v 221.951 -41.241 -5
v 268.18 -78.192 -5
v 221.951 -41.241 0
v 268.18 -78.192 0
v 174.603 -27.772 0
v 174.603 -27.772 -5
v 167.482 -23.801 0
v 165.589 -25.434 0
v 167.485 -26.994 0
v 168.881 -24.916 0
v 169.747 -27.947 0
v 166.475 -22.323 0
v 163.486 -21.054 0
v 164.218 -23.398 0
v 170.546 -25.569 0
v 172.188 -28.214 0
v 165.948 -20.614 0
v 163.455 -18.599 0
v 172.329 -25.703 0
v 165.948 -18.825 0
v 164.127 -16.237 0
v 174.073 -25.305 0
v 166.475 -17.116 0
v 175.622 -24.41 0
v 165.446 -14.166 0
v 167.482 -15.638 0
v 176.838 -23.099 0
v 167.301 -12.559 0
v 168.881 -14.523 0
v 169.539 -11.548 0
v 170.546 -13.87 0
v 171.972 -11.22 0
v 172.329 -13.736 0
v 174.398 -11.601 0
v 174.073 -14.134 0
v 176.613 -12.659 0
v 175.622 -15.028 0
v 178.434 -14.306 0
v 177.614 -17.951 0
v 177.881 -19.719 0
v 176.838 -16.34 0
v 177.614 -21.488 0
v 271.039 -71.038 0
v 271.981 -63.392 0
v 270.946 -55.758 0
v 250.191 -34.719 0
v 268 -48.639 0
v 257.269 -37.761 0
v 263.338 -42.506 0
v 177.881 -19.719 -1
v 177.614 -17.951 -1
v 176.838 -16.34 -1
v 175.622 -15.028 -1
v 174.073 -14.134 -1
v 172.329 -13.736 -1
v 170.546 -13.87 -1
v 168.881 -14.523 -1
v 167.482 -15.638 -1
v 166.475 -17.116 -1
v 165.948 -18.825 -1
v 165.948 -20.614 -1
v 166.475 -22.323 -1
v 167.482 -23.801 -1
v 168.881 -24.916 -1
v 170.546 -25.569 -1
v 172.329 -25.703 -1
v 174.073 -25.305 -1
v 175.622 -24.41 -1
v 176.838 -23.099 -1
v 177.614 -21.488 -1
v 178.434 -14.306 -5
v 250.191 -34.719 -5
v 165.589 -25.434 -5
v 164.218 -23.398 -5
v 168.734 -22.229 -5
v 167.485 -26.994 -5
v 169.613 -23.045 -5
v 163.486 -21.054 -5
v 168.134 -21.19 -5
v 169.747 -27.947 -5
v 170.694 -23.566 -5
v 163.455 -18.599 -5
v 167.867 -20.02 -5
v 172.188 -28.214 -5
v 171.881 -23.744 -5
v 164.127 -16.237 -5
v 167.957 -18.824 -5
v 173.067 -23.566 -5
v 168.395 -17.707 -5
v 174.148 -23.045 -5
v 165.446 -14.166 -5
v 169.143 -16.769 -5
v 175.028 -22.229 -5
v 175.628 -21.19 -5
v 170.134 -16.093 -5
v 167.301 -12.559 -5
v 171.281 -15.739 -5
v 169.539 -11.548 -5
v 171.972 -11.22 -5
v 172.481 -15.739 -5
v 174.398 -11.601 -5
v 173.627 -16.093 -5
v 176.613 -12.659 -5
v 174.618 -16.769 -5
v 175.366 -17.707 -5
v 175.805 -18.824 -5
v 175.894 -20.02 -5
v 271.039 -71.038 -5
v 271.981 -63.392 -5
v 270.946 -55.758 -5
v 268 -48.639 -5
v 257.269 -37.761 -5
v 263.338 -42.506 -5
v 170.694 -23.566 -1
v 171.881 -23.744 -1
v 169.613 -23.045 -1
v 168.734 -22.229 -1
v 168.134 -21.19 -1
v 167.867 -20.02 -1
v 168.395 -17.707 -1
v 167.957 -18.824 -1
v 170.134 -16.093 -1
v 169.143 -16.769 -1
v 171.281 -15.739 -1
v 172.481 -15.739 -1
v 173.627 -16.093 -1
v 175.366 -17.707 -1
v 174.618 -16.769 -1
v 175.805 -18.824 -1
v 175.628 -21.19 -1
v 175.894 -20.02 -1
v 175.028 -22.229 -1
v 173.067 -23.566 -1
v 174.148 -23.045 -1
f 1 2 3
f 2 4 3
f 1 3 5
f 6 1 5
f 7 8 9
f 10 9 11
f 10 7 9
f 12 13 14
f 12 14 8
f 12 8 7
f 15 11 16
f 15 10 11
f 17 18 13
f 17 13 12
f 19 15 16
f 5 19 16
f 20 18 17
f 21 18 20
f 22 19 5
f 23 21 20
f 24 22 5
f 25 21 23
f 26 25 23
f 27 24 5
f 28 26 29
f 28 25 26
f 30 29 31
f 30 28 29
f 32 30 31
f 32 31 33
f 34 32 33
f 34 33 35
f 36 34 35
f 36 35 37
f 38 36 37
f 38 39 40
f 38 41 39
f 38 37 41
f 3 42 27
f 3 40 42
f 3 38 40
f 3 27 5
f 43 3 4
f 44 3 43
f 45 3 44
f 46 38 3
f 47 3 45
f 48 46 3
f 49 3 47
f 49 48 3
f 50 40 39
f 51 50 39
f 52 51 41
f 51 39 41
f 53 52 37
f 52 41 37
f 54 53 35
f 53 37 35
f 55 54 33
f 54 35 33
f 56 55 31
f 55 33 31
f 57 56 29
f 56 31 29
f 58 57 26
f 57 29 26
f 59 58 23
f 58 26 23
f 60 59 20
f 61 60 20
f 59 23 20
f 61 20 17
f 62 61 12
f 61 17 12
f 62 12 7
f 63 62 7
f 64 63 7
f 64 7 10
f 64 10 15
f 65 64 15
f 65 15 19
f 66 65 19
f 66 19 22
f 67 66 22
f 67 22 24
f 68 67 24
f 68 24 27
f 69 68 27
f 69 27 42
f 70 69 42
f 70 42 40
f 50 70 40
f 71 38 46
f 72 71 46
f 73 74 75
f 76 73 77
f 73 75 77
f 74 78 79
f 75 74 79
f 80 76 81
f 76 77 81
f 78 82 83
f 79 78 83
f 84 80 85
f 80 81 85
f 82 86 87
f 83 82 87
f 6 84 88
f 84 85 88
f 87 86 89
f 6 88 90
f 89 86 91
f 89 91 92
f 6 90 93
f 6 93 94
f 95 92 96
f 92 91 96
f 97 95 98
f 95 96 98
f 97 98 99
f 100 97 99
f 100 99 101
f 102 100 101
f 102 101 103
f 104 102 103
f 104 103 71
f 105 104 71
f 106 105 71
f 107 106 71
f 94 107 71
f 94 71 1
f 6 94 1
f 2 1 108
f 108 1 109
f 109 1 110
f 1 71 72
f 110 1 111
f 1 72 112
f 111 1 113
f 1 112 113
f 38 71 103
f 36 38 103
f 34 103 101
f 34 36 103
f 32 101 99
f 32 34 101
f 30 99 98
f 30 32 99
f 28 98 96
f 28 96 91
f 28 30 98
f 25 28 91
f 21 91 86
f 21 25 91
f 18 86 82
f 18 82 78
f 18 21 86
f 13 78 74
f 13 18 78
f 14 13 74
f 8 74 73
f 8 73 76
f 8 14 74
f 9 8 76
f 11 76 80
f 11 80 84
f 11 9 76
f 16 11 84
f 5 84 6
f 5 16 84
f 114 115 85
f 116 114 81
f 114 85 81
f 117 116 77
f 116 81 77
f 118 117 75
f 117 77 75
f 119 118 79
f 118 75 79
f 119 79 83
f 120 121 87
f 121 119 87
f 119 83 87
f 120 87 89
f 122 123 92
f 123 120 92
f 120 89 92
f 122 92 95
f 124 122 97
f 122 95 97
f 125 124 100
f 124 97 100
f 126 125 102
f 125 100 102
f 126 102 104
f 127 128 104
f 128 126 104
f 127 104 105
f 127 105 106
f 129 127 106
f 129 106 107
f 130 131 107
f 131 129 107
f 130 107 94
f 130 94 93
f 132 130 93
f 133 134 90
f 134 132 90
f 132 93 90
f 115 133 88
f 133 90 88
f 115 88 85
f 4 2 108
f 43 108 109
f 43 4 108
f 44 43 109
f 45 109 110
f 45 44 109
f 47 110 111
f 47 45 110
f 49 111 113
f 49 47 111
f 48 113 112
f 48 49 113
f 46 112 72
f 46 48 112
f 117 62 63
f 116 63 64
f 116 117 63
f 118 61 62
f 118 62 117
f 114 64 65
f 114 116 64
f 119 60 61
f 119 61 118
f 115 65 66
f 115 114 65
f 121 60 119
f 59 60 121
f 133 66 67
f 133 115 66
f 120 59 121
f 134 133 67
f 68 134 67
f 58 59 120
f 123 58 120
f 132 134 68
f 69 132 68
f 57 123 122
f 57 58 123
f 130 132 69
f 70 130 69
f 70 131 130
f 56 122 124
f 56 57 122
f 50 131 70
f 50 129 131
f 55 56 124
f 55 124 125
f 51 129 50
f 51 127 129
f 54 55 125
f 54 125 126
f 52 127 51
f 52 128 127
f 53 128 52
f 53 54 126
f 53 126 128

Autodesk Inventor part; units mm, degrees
ref_plane "YZ Plane" through (0, 0, 0) normal (1, 0, 0) x (0, 1, 0)
ref_plane "XZ Plane" through (0, 0, 0) normal (0, 1, 0) x (-1, 0, 0)
ref_plane "XY Plane" through (0, 0, 0) normal (0, 0, 1) x (1, 0, 0)
sketch "スケッチ1" plane through (0, 0, 0) normal (0, 0, 1) x (1, 0, 0)
  line L0 (-101.5, 47.999998) -> (108.5, 47.999998)
  circle A0 centre (111.885049, -19.000002) radius 4
  circle A1 centre (171.880735, -19.719469) radius 4
  circle A2 centre (111.885049, -19.000002) radius 7
  circle A3 centre (171.880735, -19.719469) radius 7
  line L1 (171.880735, -19.719469) -> (111.885049, -19.000002) construction
  line L2 (171.964673, -12.719973) -> (111.968987, -12.000505)
  line L3 (111.801111, -25.999499) -> (171.796797, -26.718966)
  arc A4 (171.796797, -26.718966) -> (171.964673, -12.719973) centre (171.880735, -19.719469) ccw
  arc A5 (111.968987, -12.000505) -> (111.801111, -25.999499) centre (111.885049, -19.000002) ccw
  line L4 (173.796111, -12.986614) -> (250.19065, -34.719469)
  circle A6 centre (241.981901, -63.574563) radius 30
  line L5 (268.180017, -78.191633) -> (221.951227, -41.241357)
  line L6 (221.951227, -41.241357) -> (169.96536, -26.452325)
  line L7 (271.981901, -113.136134) -> (271.981901, -54.819928)
  line L8 (111.885049, -19.000002) -> (111.885049, 40.999998) construction
  line L9 (118.885049, -19.000002) -> (118.885049, 40.999998)
  line L10 (104.885049, 40.999998) -> (104.885049, -19.000002)
  arc A7 (104.885049, -19.000002) -> (118.885049, -19.000002) centre (111.885049, -19.000002) ccw
  arc A8 (118.885049, 40.999998) -> (104.885049, 40.999998) centre (111.885049, 40.999998) ccw
  circle A9 centre (29.431848, 47.237971) radius 30
  line L11 (113.319325, 34.148513) -> (35.578744, 17.874462)
  line L12 (-0.558472, 47.999998) -> (57.548937, 36.777124)
  line L13 (57.548937, 36.777124) -> (110.450773, 47.851484)
  circle A10 centre (113.5, -20.000002) radius 68
  line L14 (321.963533, -82.955067) -> (60.270532, 100.284345)
  line L15 (259.189194, -39.000002) -> (111.885049, -19.000002)
  arc A11 (93.592427, -27.104845) -> (135.370976, -5.924402) centre (95.060351, 21.794105) ccw
  arc A12 (135.370976, -5.924402) -> (135.847591, -3.671647) centre (132.898992, -4.224609) ccw
  arc A13 (135.847591, -3.671647) -> (83.183341, 18.55647) centre (102.157897, -9.989602) ccw
  line L16 (111.885049, -19.000002) -> (112.689188, 40.994609) construction
  line L17 (118.88442, -19.093818) -> (119.688559, 40.900793)
  line L18 (105.689816, 41.088425) -> (104.885678, -18.906186)
  arc A14 (104.885678, -18.906186) -> (118.88442, -19.093818) centre (111.885049, -19.000002) ccw
  arc A15 (119.688559, 40.900793) -> (105.689816, 41.088425) centre (112.689188, 40.994609) ccw
  line L19 (164.994898, 47.999998) -> (164.994898, 25.999998)
  line L20 (164.994898, 25.999998) -> (327.494898, -102.000002)
  circle A16 centre (116.292557, -40.000002) radius 68
  circle A17 centre (-98.885049, -0.000002) radius 67.5
  line L21 (321.363327, -8.500986) -> (-152.668056, 78.49822)
  line L22 (104.889695, -3) -> (104.889695, 0)
  line L23 (104.889695, -3) -> (72.06562, -3)
  line L24 (72.06562, 0) -> (104.889695, 0)
  circle A18 centre (83.376901, -17.5) radius 13.85
  line L25 (178.77046, -28.957215) -> (174.212284, -32.858886)
  line L26 (174.212284, -32.858886) -> (164.880735, -30.20423)
  line L27 (164.880735, -30.20423) -> (164.880735, -19.719469)
  line L28 (169.96536, -26.452325) -> (168.597236, -31.261507)
  line L29 (168.597236, -31.261507) -> (164.880735, -26.636029)
  line L30 (178.880232, -19.803408) -> (178.654717, -38.608867)
  line L31 (165.012544, -21.071485) -> (158.172386, 13.676274)
  circle A19 centre (171.880735, -19.719469) radius 7.5
  point P0 (0, 0)
  point P1 (0, 0)
  point P2 (141.882892, -19.359736)
  point P3 (111.885049, 10.999998)
  point P4 (105.885049, -0.000002)
  point P5 (105.885049, -0.000002)
  point P6 (23.732778, -42.728965)
  point P7 (112.287118, 10.997304)
  point P8 (169.272284, -12.687685)
  point P9 (163.348193, -12.616644)
  point P10 (164.492485, -18.429603)
  point P11 (172.555184, -27.189082)
  point P12 (178.847945, -22.495796)
  point P13 (170.863298, -26.707772)
  dimension "d0" = 8
  dimension "d1" = 8
  dimension "d2" = 3
  dimension "d3" = 3
  dimension "d4" = 60
  dimension "d5" = 14
  dimension "d6" = 14
  dimension "d7" = 60
  dimension "d8" = 14
  dimension "d9" = 60
  dimension "d10" = 14
  dimension "d11" = 6
  dimension "d12" = 35
  dimension "d13" = 13.271
  dimension "d14" = 14
  dimension "d15" = 20
  dimension "d16" = 15
  dimension "d17" = 22
  dimension "d18" = 150
  dimension "d19" = 162.5
  dimension "d20" = 0
  dimension "d21" = 136
  dimension "d22" = 136
  dimension "d23" = 135
  dimension "d24" = 38.2272
  dimension "d25" = 18
  dimension "d26" = 5
  dimension "d27" = 6
  dimension "d28" = 101.823
  dimension "d29" = 101.823
  dimension "d30" = 0.5
extrude "押し出し1" add sketch "スケッチ1" against normal blind 5 contours A10 L15 A16 L6 | L6 L30 L15 A10 | A16 L15 A6 L6 | L6 L15 L30 | L15 L30 A19 L4 A16 A10 | A10 A16 L15 | A6 L15 L20 L5 | A16 A10 L4 L20 A6 L15 | L6 A19 L30 L15 | A16 L4 A10 | A6 L20 L15 | L6 L3 A3 L30 A19 | L30 A3 L4 A19 | L20 L4 A6 | A6 L15 L20 | L15 A6 L20 | A3 | A1
hole "穴1" at (105.885049, -0.000002, 0) at (113.5, -20.000002, 0) at (23.732778, -42.728965, 0) at (116.292557, -40.000002, 0) at (-98.885049, -0.000002, 0) at (171.880735, -19.719469, 0) direction (0, 0, -1) diameter 8.05 depth 12 tip angle 118
sketch "スケッチ2" plane through (0, 0, 0) normal (0, 0, 1) x (1, 0, 0)
  circle A0 centre (171.880735, -19.719469) radius 4.025
  arc A1 (268.180017, -78.191633) -> (250.19065, -34.719469) centre (241.981901, -63.574563) ccw
  line L0 (268.180017, -78.191633) -> (221.951227, -41.241357)
  line L1 (221.951227, -41.241357) -> (170.863298, -26.707772)
  line L2 (170.863298, -26.707772) -> (171.796797, -26.718966)
  arc A2 (173.796111, -12.986614) -> (171.796797, -26.718966) centre (171.880735, -19.719469) ccw
  line L3 (173.796111, -12.986614) -> (250.19065, -34.719469)
  circle A3 centre (171.880735, -19.719469) radius 7
  circle A4 centre (171.880735, -19.719469) radius 8.5
  point P0 (0, 0)
  point P1 (178.433917, -14.305986)
  point P2 (174.603168, -27.771696)
  dimension "d40" = 1.5
extrude "押し出し2" add sketch "スケッチ2" against normal blind 5 contours L3 A2 L2 L1 A4
sketch "スケッチ3" plane through (0, 0, 0) normal (0, 0, 1) x (1, 0, 0)
  circle A0 centre (171.880735, -19.719469) radius 4.025
  arc A1 (268.180017, -78.191633) -> (250.19065, -34.719469) centre (241.981901, -63.574563) ccw
  line L0 (268.180017, -78.191633) -> (221.951227, -41.241357)
  line L1 (221.951227, -41.241357) -> (174.603168, -27.771696)
  arc A2 (178.433917, -14.305986) -> (174.603168, -27.771696) centre (171.880735, -19.719469) ccw
  line L2 (178.433917, -14.305986) -> (250.19065, -34.719469)
  circle A3 centre (171.880735, -19.719469) radius 6
  point P0 (0, 0)
  dimension "d43" = 12
extrude "押し出し3" cut sketch "スケッチ3" against normal blind 1 contours A3
equation "\"d9\" = d7"
equation "\"d29\" = d28"
properties part number "後ろウィング先端"
